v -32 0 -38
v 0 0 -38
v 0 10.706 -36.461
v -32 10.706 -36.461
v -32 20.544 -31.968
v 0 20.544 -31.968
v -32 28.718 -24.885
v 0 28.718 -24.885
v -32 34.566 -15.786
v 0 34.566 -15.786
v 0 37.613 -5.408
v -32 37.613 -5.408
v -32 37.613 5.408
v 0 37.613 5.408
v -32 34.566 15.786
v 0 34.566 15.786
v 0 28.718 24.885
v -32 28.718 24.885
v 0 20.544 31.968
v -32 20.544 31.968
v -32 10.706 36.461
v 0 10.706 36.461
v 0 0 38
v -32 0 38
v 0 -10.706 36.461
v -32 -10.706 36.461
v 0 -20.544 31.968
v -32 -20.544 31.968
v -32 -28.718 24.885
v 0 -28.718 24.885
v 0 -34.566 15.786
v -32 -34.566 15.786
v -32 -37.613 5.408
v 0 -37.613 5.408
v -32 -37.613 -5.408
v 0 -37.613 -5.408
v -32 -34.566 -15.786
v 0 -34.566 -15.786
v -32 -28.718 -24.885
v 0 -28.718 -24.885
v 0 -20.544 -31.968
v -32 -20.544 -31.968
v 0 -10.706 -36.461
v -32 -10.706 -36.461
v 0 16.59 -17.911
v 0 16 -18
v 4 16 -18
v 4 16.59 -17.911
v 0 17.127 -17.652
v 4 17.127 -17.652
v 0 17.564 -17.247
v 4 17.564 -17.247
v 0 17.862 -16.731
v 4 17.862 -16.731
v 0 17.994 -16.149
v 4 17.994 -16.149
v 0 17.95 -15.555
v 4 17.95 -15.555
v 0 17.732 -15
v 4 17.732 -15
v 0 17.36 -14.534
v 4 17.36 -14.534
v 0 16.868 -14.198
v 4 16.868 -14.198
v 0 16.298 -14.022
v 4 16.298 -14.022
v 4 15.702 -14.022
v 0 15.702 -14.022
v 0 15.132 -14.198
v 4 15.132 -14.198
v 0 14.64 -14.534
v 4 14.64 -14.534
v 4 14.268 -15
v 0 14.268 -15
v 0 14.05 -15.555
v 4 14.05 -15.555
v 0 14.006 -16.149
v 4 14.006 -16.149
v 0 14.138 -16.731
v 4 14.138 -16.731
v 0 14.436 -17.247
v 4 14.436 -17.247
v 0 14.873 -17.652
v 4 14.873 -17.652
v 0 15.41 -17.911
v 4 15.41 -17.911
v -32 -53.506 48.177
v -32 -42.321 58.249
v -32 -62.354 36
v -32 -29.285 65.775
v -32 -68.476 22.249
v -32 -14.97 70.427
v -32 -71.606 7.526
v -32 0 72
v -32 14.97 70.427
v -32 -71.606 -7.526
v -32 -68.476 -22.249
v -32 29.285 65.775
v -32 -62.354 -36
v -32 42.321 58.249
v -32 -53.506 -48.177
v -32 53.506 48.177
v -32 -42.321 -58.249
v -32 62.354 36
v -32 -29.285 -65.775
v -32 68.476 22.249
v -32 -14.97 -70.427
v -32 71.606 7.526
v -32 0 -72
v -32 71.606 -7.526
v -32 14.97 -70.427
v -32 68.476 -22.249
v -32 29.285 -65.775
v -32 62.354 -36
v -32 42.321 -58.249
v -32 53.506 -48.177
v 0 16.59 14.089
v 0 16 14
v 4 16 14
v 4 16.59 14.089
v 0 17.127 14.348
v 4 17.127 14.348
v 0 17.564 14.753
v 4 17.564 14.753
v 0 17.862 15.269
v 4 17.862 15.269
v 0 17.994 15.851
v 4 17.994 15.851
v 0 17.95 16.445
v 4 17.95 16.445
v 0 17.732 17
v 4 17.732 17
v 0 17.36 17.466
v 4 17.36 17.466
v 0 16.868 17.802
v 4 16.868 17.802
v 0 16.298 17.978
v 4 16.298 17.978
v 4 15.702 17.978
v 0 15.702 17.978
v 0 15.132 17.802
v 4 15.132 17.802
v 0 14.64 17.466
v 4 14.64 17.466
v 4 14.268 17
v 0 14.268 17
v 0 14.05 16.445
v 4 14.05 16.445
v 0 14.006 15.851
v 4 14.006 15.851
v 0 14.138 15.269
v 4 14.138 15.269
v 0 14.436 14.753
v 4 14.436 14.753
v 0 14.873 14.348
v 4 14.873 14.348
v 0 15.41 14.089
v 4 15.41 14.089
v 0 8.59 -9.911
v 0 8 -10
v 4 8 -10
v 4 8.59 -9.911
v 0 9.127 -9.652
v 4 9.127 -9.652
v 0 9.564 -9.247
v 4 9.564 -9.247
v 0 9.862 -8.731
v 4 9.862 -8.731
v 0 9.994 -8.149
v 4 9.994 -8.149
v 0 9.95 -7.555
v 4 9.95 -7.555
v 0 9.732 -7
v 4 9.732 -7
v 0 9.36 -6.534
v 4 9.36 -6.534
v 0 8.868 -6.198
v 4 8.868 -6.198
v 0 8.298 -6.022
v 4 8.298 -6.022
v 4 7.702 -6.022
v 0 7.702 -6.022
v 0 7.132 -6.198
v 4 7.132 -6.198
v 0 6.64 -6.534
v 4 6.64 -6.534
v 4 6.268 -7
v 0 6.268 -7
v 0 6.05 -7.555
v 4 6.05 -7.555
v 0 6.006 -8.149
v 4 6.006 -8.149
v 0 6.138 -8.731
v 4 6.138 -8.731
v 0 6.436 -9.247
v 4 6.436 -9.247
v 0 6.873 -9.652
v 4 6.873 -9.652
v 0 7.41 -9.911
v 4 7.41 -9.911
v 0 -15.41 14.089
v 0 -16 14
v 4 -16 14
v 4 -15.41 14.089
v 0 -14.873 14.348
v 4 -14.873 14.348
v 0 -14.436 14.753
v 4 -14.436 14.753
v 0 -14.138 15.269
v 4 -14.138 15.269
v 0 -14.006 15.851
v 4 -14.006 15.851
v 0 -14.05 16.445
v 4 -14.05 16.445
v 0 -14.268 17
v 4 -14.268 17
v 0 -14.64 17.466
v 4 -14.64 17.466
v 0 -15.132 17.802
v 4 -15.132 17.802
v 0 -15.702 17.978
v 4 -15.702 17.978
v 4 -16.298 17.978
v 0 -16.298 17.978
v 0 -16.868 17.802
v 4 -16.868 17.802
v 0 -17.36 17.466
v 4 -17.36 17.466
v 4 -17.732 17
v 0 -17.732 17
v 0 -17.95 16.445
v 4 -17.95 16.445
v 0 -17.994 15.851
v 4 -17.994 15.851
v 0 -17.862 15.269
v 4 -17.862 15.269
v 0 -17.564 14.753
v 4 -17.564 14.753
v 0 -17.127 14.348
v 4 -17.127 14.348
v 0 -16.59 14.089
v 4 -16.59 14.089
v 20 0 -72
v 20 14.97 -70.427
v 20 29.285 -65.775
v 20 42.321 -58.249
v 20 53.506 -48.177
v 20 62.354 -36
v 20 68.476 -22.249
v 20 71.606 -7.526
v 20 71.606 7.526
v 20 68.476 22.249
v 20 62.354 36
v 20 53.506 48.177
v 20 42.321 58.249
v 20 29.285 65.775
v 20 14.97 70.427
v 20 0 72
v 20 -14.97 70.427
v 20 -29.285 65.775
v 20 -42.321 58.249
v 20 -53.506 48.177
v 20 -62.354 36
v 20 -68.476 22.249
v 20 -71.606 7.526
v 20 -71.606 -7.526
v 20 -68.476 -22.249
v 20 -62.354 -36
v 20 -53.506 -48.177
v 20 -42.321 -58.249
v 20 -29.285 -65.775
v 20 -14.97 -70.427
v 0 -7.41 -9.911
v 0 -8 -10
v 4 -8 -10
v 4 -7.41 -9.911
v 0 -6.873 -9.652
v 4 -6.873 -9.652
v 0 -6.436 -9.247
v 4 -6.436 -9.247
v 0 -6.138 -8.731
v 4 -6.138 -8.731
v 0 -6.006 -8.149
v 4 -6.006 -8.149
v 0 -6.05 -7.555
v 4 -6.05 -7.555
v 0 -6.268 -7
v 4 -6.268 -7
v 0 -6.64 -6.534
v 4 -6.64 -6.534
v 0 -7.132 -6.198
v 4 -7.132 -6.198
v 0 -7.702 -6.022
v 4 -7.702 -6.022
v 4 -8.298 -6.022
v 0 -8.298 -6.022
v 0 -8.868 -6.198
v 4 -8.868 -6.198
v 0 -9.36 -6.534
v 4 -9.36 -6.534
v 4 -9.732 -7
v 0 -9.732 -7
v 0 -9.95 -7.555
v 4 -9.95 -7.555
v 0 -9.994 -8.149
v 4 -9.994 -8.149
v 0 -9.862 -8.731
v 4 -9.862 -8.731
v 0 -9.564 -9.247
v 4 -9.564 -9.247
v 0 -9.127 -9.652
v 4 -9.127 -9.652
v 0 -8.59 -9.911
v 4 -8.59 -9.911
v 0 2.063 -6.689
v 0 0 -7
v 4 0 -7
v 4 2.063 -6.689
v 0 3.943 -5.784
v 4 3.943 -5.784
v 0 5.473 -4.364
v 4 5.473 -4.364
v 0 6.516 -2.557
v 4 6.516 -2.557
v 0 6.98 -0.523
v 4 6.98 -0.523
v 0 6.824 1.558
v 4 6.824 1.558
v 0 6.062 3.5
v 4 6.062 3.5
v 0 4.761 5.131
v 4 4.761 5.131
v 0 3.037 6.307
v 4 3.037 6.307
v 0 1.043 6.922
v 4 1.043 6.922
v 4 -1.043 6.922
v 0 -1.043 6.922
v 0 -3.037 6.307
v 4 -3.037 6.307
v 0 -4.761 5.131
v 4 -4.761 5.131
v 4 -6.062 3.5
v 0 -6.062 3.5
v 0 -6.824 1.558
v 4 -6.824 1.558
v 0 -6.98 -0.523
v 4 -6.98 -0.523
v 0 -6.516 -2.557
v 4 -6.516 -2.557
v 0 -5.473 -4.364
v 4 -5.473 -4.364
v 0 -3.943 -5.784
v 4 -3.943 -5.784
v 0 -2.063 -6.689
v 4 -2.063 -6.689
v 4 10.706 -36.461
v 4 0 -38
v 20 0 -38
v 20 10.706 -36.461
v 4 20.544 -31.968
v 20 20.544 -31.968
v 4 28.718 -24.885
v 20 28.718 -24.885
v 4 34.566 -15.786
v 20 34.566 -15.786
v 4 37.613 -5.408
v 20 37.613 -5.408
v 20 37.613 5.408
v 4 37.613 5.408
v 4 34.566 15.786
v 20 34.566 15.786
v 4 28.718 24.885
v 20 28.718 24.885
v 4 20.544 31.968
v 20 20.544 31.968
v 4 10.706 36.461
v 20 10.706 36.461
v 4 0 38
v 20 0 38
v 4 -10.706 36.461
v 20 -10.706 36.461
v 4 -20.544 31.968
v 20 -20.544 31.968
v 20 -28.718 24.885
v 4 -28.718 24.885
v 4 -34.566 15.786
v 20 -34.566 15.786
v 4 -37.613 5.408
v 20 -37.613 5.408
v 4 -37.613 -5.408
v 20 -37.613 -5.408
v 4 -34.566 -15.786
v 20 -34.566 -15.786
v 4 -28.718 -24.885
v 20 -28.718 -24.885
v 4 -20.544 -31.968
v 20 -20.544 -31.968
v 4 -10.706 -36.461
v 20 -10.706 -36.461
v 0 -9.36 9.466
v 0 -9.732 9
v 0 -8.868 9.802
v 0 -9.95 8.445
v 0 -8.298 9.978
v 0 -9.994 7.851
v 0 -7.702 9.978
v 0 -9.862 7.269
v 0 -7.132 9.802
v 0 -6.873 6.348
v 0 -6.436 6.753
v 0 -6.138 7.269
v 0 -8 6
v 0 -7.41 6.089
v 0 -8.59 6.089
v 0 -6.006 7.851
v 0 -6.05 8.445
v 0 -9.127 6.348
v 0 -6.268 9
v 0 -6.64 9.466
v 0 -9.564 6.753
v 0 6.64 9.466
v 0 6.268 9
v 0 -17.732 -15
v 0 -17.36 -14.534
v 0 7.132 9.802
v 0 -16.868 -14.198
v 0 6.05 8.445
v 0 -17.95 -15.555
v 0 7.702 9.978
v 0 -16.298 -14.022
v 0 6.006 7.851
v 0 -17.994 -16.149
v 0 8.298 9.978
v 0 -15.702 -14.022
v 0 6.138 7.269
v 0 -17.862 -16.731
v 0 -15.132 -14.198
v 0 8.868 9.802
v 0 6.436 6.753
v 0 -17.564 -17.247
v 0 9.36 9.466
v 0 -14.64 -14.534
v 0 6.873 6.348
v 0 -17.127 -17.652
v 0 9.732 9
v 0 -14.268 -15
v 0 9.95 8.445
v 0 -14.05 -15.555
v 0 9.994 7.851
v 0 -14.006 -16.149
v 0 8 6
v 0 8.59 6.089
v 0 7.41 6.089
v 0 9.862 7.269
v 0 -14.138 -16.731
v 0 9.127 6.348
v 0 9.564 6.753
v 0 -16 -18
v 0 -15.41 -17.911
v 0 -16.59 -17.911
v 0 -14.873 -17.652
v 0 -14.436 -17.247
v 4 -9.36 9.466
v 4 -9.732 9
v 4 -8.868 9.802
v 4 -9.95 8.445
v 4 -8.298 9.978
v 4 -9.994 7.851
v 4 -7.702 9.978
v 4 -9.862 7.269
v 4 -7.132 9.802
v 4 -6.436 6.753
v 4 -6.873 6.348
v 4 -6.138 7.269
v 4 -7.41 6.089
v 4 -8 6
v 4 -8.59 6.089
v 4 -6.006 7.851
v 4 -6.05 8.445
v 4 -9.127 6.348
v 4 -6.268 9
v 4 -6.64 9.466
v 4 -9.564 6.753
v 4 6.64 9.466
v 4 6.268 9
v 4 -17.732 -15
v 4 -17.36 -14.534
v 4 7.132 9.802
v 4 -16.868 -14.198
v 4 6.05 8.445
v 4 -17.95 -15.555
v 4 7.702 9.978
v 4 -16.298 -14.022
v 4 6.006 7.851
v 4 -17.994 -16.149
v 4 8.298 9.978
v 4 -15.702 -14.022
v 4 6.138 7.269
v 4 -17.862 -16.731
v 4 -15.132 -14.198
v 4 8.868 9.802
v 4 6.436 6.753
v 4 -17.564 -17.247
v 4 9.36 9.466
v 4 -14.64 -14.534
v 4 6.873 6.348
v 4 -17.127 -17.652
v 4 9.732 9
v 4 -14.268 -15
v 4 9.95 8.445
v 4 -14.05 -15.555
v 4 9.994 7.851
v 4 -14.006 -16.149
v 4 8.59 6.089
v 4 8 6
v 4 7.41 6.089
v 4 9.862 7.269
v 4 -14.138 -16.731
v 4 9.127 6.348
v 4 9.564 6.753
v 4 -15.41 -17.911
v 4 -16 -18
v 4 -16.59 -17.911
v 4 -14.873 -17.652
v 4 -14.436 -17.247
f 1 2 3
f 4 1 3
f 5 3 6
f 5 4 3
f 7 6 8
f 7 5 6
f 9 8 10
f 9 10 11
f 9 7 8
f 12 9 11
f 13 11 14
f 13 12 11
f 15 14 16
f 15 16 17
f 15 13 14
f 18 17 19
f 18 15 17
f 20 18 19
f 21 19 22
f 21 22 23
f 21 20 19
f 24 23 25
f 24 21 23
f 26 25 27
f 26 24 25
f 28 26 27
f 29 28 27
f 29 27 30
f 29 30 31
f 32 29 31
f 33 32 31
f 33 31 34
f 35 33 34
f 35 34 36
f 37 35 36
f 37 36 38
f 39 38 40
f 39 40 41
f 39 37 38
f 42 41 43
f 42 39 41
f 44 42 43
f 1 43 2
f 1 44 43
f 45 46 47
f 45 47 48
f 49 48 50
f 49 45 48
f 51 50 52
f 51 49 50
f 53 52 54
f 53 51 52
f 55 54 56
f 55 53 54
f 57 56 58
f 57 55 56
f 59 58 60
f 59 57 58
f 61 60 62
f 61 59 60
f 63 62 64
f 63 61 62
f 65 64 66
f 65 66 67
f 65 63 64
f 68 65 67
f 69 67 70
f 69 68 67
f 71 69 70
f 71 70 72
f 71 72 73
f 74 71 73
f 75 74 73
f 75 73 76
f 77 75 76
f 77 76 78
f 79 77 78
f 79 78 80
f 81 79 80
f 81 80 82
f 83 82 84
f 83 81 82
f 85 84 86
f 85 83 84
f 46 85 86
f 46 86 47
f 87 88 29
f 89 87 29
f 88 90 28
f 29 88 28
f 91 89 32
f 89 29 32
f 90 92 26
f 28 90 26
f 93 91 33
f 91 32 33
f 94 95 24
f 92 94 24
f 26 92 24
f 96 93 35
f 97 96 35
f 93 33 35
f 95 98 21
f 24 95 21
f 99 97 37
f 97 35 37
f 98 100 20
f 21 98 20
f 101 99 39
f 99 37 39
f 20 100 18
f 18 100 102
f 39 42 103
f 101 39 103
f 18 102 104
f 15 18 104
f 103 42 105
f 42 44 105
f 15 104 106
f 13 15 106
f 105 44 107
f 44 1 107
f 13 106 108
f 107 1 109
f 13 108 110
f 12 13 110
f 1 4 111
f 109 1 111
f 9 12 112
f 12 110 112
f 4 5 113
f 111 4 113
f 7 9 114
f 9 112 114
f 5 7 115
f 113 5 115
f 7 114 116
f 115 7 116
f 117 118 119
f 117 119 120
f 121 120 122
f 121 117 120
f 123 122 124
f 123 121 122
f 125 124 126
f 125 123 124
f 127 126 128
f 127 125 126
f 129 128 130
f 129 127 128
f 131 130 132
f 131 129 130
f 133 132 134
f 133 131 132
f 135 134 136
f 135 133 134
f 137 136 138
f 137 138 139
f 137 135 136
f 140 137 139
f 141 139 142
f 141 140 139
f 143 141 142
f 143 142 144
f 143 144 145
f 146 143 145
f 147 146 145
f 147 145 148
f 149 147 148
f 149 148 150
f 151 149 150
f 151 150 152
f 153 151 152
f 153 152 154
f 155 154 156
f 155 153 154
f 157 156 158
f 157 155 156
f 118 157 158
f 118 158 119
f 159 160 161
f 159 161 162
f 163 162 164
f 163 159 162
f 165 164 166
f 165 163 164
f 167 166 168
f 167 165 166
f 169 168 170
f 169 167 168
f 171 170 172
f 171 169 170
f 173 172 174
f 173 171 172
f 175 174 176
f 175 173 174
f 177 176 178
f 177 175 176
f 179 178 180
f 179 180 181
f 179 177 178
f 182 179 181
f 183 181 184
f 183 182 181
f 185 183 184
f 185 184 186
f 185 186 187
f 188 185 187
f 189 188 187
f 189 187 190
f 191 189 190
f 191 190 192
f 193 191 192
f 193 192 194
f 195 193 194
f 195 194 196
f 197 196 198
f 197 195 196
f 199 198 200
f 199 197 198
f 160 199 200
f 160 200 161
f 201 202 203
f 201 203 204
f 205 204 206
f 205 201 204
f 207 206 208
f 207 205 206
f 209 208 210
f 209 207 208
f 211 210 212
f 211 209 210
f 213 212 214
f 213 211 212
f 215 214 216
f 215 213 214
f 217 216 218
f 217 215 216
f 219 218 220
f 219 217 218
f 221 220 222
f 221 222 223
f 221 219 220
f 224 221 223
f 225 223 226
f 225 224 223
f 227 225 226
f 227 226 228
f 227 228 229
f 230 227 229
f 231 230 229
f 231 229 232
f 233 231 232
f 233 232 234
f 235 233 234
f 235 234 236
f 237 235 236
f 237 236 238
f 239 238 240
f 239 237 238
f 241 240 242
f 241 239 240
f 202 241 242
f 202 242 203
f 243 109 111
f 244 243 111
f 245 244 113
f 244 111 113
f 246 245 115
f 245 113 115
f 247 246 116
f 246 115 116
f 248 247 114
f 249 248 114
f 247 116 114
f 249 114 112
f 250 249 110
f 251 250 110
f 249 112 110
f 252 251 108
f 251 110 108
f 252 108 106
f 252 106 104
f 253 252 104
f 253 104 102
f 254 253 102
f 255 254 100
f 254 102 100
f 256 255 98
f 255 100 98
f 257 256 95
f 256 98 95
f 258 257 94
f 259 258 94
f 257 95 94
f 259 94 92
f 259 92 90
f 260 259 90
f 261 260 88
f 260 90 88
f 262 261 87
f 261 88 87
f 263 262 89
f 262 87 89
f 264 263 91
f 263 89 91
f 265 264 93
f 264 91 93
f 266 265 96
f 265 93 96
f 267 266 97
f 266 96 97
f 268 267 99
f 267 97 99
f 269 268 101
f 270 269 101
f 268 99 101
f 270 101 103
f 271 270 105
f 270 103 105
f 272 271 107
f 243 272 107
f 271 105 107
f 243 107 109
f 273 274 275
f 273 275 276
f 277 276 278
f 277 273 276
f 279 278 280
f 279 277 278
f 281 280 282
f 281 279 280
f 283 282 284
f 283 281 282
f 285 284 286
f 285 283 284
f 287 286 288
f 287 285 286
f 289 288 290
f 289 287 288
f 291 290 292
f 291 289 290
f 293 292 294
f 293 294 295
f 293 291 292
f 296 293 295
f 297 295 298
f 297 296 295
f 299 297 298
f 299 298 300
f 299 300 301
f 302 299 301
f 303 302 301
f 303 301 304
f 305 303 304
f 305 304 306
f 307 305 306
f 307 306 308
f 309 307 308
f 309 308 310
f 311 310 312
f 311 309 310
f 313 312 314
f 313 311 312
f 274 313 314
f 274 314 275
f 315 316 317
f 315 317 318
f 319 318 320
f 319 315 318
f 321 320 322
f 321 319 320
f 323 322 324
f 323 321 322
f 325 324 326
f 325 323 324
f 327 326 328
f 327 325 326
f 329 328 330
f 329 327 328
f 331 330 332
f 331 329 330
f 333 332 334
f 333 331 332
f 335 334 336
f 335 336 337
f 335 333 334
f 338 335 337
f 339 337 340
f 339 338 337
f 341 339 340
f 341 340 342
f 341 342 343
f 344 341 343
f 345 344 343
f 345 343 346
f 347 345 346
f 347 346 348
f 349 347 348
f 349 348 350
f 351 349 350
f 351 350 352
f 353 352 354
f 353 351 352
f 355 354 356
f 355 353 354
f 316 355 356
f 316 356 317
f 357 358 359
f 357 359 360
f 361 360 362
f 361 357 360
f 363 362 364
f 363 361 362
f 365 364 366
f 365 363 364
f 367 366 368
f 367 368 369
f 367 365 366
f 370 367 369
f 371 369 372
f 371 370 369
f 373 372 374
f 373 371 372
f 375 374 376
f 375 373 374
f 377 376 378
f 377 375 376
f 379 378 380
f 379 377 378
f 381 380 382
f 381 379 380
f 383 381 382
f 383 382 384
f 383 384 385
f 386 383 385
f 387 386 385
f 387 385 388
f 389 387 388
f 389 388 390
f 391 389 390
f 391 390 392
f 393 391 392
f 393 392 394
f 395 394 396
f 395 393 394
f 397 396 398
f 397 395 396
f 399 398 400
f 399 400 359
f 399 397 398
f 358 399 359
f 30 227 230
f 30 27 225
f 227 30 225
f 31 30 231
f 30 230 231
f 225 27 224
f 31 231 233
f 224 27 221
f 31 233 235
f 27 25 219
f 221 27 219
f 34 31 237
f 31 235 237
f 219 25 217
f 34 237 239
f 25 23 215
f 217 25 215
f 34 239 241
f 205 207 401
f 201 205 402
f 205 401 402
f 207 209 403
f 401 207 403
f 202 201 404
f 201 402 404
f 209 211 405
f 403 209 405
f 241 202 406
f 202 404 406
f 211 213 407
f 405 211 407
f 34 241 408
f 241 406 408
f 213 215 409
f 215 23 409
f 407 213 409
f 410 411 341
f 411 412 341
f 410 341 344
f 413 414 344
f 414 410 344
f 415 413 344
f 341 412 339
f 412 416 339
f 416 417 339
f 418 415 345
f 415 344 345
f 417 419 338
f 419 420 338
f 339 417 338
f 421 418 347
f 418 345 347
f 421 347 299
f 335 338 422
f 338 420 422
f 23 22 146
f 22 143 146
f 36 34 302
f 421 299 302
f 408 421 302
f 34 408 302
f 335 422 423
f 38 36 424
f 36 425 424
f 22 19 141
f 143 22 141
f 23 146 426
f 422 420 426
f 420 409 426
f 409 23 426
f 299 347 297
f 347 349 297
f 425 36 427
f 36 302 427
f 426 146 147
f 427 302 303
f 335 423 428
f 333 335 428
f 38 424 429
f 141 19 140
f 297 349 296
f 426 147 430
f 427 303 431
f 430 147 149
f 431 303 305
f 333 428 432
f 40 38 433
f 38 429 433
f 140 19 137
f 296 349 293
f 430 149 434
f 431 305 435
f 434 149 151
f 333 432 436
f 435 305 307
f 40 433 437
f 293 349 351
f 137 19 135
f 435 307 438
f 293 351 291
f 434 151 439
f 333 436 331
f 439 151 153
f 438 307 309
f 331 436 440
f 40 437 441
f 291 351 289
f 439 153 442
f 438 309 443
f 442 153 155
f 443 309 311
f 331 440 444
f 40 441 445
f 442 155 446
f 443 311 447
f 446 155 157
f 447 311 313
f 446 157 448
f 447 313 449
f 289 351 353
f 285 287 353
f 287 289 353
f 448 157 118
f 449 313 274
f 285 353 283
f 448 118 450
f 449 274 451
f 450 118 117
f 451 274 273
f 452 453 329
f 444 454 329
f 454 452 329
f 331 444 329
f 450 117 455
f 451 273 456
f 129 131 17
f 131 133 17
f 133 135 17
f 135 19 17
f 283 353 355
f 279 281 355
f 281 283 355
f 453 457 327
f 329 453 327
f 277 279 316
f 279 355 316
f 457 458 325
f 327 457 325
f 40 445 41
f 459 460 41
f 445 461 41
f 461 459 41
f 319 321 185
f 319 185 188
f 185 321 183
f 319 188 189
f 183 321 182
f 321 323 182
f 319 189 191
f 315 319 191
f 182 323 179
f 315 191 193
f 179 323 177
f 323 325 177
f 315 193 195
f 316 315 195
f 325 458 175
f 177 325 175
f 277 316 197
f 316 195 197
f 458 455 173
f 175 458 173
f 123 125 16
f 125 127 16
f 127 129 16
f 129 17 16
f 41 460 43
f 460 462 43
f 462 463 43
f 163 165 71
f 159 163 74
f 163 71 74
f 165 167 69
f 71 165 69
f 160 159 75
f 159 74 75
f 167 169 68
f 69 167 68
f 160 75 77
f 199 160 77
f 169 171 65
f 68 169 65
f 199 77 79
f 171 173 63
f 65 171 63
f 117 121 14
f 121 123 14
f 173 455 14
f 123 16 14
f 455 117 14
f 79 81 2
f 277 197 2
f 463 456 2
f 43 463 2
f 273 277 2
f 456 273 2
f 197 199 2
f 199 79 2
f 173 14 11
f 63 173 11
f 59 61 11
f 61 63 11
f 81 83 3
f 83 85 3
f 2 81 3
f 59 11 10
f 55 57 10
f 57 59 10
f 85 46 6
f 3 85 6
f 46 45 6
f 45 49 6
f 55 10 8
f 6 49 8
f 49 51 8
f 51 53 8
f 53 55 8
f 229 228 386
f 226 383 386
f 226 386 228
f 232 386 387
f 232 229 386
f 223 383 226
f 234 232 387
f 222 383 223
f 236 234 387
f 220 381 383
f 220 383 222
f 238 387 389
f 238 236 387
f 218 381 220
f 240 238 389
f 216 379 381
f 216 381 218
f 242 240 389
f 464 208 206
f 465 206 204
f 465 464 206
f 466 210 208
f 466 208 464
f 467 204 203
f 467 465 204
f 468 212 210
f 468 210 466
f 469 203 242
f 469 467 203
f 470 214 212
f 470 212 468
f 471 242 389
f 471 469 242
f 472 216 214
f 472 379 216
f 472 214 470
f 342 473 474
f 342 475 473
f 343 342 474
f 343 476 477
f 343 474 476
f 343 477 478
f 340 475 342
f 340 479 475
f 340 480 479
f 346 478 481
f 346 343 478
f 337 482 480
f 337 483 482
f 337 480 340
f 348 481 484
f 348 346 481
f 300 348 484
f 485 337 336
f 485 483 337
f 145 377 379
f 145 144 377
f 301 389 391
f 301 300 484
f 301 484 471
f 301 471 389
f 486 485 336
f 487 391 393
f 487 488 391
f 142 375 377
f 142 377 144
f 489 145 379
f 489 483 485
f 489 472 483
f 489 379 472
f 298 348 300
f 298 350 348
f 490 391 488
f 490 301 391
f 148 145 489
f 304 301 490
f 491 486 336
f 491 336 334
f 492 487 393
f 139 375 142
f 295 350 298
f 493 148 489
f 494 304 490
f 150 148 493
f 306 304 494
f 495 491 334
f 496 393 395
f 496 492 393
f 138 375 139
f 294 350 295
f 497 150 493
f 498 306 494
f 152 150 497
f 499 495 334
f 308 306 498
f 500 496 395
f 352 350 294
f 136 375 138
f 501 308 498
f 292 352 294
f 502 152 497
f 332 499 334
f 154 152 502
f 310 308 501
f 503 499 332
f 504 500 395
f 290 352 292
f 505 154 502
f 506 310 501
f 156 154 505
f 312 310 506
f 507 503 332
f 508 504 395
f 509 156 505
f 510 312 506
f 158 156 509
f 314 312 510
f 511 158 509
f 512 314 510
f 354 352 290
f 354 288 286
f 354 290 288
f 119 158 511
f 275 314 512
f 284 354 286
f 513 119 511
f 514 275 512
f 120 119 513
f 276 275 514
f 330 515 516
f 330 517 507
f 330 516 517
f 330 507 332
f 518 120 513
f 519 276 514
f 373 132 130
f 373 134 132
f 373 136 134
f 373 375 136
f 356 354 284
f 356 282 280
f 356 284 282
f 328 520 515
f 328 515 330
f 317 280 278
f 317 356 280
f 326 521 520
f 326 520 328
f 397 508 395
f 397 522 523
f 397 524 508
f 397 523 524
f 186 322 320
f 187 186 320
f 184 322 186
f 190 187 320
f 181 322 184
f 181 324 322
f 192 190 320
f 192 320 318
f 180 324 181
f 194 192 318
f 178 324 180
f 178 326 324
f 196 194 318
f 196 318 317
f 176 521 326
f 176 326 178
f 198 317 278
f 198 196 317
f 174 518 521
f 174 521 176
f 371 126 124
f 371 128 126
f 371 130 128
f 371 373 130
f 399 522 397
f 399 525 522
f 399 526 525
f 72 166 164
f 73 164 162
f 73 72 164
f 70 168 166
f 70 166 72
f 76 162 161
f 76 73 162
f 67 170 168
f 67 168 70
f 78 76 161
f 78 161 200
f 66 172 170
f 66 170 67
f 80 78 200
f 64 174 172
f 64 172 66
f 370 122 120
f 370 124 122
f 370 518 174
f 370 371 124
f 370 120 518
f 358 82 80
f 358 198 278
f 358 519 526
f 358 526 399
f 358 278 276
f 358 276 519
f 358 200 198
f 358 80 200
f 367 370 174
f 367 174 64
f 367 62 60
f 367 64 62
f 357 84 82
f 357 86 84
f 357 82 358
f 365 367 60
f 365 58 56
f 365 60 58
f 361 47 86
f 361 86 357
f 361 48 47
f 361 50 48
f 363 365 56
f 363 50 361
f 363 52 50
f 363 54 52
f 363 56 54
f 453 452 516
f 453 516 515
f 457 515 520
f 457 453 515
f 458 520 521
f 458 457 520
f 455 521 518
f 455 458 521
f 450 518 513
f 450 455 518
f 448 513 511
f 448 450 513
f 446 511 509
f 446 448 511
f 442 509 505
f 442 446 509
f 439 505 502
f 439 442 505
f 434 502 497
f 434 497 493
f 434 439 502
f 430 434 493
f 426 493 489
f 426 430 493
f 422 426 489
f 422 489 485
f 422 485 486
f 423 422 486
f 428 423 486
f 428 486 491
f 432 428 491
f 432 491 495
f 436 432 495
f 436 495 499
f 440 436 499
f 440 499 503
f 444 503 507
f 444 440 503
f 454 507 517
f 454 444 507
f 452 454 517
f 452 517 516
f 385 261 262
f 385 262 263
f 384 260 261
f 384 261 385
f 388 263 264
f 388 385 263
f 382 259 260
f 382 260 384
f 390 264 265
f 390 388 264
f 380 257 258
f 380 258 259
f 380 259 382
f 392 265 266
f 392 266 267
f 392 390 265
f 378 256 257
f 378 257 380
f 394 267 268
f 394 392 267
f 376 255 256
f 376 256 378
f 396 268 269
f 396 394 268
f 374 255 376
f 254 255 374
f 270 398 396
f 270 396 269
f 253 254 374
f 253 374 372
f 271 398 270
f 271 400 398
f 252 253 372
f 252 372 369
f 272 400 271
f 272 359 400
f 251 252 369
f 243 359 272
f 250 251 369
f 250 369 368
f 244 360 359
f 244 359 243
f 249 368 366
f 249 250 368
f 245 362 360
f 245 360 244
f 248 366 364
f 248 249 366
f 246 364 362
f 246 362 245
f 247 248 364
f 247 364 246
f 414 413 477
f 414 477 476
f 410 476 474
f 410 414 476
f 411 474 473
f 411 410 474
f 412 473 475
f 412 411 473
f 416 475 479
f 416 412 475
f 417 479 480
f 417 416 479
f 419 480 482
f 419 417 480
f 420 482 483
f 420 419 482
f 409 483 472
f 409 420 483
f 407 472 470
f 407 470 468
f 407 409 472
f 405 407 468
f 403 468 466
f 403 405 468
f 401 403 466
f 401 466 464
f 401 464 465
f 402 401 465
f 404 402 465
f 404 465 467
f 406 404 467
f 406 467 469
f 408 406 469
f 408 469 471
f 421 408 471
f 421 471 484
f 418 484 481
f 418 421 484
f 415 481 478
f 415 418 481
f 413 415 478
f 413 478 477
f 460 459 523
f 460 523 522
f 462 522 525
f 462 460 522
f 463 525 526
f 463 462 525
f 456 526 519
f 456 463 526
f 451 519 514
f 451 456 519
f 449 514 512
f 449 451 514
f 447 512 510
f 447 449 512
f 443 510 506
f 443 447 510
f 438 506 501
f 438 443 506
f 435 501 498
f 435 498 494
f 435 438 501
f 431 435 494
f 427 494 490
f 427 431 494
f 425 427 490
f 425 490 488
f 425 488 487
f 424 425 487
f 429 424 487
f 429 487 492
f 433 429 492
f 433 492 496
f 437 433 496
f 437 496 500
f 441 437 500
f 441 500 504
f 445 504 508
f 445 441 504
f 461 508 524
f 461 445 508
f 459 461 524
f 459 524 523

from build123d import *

# Parameters (mm, degrees)
SK_TYRE_R               = 72
EX_TYRE_DEPTH           = 52
SK_RECESSDEEP_R         = 38
CUT_RECESSDEEP_DEPTH    = 32
CUT_RECESSSHALLOW_START = -16
SK_RECESSSHALLOW_R      = 38
CUT_RECESSSHALLOW_DEPTH = 16
SK_WEBHOLES_R           = 7
SK_WEBHOLES_R_2         = 2
CUT_WEBHOLES_DEPTH      = 4


with BuildPart() as part:
    # SK_Tyre → EX_Tyre (new body)
    with BuildSketch(Plane(origin=(-32, 0, 0), x_dir=(0, 0, -1), z_dir=(1, 0, 0))):
        Circle(SK_TYRE_R)
    extrude(amount=EX_TYRE_DEPTH)

    # SK_RecessDeep → CUT_RecessDeep (cut)
    with BuildSketch(Plane(origin=(-32, 0, 0), x_dir=(0, 0, -1), z_dir=(1, 0, 0))):
        Circle(SK_RECESSDEEP_R)
    extrude(amount=CUT_RECESSDEEP_DEPTH, mode=Mode.SUBTRACT)

    # SK_RecessShallow → CUT_RecessShallow (cut)
    with BuildSketch(Plane(origin=(20, 0, 0), x_dir=(0, 0, -1), z_dir=(1, 0, 0)).offset(CUT_RECESSSHALLOW_START)):
        Circle(SK_RECESSSHALLOW_R)
    extrude(amount=CUT_RECESSSHALLOW_DEPTH, mode=Mode.SUBTRACT)

    # SK_WebHoles → CUT_WebHoles (cut)
    with BuildSketch(Plane(origin=(0, 0, 0), x_dir=(0, 0, -1), z_dir=(1, 0, 0))):
        Circle(SK_WEBHOLES_R)
        with Locations((-8, 8)):
            Circle(SK_WEBHOLES_R_2)
        with Locations((-8, -8)):
            Circle(SK_WEBHOLES_R_2)
        with Locations((8, 8)):
            Circle(SK_WEBHOLES_R_2)
        with Locations((8, -8)):
            Circle(SK_WEBHOLES_R_2)
        with Locations((-16, 16)):
            Circle(SK_WEBHOLES_R_2)
        with Locations((-16, -16)):
            Circle(SK_WEBHOLES_R_2)
        with Locations((16, 16)):
            Circle(SK_WEBHOLES_R_2)
        with Locations((16, -16)):
            Circle(SK_WEBHOLES_R_2)
    extrude(amount=CUT_WEBHOLES_DEPTH, mode=Mode.SUBTRACT)


solid = part.part
